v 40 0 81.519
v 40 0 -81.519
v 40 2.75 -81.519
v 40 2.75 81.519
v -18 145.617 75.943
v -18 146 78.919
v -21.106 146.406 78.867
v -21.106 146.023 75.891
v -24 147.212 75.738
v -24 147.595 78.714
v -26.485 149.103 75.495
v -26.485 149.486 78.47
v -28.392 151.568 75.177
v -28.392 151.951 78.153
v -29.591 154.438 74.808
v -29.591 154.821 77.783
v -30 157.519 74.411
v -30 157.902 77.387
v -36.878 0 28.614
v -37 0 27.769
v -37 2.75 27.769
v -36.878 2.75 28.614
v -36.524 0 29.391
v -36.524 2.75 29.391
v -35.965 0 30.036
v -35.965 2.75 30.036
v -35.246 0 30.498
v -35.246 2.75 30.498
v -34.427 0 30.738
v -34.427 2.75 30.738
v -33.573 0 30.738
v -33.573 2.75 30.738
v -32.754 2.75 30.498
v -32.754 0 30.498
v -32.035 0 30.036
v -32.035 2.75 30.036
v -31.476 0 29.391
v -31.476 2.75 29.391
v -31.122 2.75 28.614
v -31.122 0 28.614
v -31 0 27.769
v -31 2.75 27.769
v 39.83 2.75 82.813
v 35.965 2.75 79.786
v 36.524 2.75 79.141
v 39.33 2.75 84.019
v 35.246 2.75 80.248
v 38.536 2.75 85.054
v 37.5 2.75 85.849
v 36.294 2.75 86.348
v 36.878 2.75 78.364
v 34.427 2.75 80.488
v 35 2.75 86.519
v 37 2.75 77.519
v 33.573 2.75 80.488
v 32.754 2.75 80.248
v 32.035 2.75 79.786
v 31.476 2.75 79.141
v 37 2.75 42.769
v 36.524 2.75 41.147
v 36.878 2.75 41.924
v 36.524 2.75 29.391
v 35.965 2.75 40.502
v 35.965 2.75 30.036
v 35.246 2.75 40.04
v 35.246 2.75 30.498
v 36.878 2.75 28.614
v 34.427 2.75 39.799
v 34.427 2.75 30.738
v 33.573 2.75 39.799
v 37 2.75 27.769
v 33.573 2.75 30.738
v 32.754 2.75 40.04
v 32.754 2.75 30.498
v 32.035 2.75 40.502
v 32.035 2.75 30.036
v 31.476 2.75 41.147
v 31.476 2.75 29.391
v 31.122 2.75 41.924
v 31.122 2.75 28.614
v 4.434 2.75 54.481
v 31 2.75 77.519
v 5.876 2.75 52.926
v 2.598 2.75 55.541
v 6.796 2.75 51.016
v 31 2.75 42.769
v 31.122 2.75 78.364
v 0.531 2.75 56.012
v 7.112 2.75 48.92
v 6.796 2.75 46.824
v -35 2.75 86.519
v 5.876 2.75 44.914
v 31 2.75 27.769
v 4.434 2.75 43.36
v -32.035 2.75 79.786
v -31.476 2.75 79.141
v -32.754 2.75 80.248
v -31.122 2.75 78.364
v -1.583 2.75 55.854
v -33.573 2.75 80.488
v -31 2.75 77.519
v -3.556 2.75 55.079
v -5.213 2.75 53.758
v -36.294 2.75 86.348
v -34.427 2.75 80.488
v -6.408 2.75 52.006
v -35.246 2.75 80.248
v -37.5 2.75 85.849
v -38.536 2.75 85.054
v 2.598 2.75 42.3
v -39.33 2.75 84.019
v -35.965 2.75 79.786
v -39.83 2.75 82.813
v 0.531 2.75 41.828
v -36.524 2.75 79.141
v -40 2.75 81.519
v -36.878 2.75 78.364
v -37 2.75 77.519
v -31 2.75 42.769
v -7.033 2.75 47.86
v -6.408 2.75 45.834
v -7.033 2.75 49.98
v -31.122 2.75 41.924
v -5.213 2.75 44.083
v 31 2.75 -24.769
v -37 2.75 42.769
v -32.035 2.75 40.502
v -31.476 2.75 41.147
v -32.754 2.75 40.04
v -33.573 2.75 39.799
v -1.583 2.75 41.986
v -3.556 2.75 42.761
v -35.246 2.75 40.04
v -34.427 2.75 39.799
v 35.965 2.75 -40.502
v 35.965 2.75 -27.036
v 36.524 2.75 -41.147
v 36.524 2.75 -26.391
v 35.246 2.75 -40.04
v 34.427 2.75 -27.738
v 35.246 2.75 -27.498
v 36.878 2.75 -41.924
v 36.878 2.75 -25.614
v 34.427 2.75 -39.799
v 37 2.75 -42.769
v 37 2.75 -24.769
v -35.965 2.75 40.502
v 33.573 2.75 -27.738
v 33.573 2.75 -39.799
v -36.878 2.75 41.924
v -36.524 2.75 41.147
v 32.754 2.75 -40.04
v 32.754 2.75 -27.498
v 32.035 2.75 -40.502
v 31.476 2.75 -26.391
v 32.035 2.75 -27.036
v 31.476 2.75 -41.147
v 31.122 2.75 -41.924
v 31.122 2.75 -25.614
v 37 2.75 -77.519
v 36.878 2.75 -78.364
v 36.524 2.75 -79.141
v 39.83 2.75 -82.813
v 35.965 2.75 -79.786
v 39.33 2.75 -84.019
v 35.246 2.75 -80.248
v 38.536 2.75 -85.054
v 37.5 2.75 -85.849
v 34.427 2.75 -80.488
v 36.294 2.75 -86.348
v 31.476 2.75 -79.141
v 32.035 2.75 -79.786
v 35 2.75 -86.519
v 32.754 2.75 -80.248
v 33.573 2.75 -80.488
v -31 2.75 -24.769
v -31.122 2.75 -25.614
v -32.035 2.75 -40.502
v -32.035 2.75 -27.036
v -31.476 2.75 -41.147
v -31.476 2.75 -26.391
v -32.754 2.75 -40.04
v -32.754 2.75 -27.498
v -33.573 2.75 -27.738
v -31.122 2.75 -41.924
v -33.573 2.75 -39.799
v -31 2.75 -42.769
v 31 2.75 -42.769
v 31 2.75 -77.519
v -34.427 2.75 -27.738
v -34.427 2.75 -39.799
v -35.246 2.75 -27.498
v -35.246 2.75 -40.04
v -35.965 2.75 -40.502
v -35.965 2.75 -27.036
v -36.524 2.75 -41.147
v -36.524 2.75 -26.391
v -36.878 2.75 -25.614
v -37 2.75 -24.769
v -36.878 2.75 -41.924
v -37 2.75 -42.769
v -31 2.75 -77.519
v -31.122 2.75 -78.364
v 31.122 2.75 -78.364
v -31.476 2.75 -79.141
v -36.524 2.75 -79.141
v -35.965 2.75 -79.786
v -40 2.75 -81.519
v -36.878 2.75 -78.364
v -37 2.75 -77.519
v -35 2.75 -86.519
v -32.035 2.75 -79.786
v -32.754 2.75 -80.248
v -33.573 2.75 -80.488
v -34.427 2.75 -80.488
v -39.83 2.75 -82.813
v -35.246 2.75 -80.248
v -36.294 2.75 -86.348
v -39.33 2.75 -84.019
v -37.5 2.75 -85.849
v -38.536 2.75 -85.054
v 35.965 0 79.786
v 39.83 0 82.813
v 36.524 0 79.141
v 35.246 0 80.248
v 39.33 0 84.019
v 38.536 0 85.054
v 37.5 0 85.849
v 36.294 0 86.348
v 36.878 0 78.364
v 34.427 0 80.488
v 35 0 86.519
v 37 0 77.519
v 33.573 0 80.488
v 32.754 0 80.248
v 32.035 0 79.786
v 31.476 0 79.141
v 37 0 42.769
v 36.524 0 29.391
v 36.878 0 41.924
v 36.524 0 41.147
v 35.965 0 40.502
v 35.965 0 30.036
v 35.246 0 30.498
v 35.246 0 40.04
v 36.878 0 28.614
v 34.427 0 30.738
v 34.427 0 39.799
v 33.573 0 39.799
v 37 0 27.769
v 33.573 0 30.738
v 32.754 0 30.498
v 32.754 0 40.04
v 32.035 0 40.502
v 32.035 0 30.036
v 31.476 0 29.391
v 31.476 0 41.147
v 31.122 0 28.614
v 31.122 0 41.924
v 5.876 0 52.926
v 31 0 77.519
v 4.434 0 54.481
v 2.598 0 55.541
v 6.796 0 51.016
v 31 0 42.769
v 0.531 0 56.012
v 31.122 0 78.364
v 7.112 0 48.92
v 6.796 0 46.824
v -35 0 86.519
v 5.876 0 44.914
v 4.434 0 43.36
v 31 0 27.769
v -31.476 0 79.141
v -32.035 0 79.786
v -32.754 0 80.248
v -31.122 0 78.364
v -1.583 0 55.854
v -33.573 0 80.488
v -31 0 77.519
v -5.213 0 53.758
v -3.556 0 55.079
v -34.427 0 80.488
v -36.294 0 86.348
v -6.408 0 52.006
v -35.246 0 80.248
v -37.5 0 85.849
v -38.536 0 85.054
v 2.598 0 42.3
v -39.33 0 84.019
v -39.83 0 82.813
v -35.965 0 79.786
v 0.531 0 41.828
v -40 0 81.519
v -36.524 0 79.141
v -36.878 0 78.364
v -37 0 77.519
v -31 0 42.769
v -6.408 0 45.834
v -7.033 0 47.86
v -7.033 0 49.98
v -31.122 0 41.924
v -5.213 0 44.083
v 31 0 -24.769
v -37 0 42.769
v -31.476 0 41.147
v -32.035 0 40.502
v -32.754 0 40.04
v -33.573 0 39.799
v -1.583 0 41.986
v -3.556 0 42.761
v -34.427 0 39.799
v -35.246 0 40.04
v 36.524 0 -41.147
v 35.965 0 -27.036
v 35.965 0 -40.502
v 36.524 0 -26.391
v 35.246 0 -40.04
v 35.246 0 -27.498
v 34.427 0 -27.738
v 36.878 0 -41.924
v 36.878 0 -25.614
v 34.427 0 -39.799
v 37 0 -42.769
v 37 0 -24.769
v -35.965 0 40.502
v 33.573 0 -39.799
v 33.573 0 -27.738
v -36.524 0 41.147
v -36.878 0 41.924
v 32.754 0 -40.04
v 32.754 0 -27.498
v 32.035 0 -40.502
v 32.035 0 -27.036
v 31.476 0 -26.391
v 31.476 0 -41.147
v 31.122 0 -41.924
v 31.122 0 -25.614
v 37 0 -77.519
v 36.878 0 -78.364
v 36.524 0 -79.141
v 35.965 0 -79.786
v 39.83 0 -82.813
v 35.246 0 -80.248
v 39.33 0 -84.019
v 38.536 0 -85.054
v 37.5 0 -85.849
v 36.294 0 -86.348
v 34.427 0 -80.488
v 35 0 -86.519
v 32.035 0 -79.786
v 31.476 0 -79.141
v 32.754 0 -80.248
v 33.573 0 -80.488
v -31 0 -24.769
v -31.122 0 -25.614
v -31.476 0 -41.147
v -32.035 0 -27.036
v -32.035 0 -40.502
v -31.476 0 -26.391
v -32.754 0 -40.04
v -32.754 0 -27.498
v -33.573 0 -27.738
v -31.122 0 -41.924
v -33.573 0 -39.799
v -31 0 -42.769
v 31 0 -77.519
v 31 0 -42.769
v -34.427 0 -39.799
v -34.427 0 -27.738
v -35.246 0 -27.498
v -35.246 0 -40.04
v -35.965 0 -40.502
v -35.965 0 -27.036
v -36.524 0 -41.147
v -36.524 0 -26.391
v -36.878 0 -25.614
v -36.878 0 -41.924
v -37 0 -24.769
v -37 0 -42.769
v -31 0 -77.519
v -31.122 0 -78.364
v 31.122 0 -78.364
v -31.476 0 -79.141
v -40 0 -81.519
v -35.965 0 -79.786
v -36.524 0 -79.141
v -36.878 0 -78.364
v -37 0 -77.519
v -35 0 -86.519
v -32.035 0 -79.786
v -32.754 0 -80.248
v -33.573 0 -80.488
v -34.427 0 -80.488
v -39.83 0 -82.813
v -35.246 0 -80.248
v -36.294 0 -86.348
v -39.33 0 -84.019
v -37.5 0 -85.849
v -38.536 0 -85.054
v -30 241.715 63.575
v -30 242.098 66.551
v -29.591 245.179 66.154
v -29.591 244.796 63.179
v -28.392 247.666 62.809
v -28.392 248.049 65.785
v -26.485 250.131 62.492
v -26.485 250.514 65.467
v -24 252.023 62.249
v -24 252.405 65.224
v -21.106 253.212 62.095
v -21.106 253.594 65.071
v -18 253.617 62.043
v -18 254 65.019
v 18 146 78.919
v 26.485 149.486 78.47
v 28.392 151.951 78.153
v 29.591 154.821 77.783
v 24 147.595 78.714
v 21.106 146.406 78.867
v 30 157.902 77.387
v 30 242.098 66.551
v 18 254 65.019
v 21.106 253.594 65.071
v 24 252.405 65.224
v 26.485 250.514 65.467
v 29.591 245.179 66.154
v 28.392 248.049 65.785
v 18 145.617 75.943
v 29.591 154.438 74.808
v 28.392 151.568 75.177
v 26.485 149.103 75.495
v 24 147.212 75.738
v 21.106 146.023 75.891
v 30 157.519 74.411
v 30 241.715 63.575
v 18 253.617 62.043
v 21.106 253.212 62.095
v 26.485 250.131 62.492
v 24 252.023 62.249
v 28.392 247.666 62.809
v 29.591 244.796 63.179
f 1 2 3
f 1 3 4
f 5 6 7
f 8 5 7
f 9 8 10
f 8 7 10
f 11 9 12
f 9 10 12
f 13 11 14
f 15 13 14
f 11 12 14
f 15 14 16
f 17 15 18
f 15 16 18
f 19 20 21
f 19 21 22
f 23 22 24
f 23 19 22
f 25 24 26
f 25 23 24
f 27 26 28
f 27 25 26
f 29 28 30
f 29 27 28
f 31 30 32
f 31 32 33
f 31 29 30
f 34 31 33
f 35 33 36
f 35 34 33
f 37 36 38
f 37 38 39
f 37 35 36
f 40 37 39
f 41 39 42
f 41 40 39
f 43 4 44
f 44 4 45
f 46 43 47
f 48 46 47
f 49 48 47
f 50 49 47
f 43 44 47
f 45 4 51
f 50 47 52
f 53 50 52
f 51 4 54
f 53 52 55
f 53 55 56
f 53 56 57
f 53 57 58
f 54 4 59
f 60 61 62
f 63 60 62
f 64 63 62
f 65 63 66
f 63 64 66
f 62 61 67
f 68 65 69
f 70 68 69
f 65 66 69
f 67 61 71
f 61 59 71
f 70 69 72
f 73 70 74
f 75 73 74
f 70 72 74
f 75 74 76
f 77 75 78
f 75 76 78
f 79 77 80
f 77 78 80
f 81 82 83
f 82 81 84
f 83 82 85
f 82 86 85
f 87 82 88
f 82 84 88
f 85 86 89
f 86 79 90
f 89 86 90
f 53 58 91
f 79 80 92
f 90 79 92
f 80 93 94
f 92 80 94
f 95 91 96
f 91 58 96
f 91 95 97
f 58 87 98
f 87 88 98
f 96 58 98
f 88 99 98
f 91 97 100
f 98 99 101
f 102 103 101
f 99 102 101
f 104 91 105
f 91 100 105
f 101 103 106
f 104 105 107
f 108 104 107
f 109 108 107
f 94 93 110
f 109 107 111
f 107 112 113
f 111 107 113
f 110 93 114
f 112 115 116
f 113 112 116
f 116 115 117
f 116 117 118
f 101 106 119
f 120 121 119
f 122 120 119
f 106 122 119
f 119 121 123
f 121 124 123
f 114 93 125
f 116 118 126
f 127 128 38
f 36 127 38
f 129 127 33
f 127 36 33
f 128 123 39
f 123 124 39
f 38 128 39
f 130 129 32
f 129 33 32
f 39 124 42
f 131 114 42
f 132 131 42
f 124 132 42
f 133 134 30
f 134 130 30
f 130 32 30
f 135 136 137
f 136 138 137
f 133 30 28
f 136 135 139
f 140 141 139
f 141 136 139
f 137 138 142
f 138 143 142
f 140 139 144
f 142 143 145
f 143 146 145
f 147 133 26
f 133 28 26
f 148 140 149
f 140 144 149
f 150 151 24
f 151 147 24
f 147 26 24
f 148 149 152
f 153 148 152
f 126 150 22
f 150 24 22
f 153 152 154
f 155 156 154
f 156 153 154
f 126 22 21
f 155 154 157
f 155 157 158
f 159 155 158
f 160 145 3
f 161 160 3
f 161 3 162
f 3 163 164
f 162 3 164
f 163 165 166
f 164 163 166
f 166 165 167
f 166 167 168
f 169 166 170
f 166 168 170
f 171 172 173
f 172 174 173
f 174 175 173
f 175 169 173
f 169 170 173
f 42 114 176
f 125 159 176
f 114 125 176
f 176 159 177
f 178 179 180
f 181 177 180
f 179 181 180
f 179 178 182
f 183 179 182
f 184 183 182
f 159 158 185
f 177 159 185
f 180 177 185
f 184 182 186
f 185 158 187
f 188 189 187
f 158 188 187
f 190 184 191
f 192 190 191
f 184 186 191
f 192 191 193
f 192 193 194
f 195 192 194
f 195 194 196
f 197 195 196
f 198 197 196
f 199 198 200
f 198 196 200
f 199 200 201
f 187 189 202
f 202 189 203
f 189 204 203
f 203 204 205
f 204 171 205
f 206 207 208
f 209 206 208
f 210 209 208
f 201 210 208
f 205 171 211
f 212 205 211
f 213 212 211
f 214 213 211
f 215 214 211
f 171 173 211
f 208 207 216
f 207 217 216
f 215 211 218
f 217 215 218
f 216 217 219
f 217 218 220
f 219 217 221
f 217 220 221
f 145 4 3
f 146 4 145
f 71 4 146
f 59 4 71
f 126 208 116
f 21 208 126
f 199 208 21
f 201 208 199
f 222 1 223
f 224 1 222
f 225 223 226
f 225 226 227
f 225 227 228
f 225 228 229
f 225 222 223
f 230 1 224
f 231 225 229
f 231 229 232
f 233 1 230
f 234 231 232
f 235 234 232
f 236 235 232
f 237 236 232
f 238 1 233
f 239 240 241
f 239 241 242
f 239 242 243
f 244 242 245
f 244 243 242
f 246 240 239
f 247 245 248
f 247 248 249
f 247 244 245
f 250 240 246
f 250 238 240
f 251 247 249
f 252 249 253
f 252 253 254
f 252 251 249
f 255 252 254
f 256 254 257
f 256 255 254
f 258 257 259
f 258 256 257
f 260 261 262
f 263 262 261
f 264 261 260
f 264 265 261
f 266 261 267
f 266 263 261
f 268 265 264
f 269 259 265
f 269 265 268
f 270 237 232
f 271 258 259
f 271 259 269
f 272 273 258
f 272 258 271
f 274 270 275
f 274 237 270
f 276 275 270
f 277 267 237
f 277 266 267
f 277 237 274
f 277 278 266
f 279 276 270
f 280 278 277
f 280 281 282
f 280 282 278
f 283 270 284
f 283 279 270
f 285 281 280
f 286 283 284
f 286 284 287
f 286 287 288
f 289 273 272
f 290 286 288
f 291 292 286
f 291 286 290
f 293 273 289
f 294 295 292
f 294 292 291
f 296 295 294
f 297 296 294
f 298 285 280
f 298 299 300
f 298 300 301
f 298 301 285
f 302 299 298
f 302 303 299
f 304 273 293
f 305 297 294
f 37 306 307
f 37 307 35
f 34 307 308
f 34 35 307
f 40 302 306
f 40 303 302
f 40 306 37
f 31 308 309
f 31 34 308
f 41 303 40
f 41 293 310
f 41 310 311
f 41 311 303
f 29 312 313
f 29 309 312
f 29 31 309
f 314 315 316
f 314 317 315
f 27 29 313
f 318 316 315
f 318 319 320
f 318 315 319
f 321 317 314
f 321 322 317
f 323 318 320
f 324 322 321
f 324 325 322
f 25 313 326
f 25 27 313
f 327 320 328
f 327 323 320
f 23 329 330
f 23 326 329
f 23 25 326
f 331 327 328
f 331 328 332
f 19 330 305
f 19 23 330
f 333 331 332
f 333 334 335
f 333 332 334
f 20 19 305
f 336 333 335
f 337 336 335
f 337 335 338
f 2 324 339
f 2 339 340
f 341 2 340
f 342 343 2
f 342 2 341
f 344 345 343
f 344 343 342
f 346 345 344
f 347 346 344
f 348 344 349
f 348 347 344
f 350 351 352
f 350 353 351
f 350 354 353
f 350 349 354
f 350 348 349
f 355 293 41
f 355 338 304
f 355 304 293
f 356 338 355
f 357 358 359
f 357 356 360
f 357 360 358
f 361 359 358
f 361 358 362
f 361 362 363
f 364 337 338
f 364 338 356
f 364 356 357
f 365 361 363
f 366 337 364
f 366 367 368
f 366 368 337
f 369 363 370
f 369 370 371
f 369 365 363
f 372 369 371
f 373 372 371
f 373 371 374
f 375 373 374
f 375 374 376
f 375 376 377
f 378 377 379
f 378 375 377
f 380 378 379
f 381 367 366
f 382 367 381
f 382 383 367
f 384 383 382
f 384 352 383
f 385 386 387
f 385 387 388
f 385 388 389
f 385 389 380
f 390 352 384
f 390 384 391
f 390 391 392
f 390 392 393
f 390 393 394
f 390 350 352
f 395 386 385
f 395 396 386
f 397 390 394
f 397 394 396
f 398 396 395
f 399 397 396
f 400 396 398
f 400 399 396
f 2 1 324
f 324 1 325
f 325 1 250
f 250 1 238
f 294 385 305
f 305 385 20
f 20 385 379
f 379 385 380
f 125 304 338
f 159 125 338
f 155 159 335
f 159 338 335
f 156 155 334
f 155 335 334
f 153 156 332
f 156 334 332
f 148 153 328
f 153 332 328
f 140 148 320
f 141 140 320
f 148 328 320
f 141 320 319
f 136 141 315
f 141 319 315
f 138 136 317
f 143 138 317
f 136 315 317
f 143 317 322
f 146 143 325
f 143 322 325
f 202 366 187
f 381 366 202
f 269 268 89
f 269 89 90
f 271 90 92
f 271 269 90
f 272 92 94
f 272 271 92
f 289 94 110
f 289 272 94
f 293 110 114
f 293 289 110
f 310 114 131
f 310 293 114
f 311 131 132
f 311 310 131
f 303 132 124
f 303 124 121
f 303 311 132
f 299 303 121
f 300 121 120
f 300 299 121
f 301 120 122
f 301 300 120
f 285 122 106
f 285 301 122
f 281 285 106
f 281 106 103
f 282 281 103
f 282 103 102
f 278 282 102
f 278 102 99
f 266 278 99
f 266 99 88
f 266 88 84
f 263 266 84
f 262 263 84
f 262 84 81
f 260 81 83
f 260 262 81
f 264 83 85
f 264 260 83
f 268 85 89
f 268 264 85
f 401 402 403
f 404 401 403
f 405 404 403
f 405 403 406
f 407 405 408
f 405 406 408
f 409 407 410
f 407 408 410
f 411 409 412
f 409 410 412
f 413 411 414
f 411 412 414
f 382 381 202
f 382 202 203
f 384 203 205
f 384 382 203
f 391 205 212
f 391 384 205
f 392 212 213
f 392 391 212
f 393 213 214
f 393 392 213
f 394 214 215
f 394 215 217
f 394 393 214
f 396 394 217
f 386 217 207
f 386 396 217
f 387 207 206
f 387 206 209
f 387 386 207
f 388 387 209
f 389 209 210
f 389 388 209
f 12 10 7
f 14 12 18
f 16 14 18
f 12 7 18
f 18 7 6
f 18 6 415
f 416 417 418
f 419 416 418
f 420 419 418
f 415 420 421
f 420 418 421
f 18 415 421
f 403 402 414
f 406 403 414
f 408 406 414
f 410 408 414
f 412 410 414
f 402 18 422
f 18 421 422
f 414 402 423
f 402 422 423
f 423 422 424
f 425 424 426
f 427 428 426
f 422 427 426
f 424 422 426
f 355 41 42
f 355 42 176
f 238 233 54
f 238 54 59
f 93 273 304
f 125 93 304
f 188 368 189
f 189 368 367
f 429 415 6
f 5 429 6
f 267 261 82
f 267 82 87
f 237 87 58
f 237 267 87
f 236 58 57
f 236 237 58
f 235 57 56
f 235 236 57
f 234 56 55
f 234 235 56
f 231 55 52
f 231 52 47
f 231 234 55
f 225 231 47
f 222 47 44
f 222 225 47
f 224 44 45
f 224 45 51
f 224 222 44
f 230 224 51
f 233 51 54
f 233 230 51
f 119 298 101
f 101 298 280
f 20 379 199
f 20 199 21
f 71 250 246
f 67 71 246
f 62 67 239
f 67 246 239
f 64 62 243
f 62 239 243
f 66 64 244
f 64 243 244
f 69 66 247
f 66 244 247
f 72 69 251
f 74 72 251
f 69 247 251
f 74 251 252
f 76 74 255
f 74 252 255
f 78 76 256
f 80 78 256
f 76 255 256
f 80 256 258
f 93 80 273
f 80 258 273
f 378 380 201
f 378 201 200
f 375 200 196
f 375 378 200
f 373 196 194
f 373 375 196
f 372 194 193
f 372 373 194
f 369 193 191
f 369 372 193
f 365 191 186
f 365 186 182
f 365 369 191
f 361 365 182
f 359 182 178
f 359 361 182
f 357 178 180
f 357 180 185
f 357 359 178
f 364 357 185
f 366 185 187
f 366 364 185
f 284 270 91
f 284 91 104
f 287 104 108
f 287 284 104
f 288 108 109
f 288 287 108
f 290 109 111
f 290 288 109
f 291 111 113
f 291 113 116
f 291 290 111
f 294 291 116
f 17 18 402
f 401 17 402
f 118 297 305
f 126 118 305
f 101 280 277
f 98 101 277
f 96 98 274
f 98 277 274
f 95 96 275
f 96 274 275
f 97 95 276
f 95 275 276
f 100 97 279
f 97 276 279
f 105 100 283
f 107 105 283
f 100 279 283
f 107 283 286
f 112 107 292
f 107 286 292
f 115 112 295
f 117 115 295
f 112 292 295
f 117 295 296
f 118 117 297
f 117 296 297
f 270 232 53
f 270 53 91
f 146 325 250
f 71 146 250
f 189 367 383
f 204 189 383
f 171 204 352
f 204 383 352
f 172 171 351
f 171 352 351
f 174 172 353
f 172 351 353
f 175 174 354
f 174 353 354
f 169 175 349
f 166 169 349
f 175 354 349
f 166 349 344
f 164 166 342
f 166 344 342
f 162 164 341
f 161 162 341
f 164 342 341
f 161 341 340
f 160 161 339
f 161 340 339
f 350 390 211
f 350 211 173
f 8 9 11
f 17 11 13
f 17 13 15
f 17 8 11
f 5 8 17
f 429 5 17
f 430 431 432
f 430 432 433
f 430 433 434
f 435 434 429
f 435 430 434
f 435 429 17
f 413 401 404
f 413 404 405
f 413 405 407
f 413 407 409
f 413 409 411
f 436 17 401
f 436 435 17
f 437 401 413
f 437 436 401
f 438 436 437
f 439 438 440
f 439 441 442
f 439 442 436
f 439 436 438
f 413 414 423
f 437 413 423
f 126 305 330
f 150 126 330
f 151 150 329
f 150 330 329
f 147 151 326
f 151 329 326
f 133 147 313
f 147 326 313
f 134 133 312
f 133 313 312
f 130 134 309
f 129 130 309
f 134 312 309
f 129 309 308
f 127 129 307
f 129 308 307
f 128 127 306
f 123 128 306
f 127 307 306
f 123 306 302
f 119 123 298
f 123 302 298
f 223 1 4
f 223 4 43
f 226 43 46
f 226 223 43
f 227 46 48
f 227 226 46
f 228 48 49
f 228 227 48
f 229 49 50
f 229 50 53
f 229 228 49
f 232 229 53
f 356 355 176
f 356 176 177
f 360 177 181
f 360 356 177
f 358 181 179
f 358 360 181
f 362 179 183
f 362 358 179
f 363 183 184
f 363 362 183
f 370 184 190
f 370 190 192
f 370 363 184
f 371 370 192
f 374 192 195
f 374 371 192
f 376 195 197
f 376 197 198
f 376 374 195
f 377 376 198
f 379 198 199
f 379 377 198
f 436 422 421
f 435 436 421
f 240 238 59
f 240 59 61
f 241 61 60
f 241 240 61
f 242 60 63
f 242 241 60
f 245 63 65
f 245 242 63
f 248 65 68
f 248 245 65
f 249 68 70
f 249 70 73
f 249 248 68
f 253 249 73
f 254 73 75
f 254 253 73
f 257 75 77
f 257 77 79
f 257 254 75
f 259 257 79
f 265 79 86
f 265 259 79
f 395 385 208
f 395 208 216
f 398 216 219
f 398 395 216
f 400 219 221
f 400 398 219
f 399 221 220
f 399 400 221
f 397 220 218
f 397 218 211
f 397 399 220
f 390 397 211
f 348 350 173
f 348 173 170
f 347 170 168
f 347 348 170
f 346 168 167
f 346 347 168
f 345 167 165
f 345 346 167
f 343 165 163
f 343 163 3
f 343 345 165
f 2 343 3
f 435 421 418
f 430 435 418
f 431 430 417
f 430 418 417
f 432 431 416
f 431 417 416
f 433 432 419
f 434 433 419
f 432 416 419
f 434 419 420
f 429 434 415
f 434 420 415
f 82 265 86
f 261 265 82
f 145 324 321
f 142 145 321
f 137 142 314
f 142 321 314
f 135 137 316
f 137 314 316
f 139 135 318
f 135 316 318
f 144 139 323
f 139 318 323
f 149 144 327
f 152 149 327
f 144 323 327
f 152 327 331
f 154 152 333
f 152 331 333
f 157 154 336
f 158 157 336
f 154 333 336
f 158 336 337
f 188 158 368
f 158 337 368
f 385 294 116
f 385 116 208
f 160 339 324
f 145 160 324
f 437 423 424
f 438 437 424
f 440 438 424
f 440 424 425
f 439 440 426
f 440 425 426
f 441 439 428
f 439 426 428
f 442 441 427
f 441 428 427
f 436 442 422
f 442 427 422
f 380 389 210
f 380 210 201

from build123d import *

# Parameters (mm, degrees)
SKETCH1_R           = 7.112045721
BOSS_EXTRUDE1_DEPTH = 2.75
BOSS_EXTRUDE2_DEPTH = 3


with BuildPart() as part:
    # Sketch1 → Boss-Extrude1 (new body)
    with BuildSketch(Plane(origin=(0, 0, 0), x_dir=(1, 0, 0), z_dir=(0, 1, 0))):
        with BuildLine():
            Line((-35, 86.51875), (35, 86.51875))
            ThreePointArc((35, 86.51875), (38.535533906, 85.054283906), (40, 81.51875))
            Line((40, 81.51875), (40, -81.51875))
            ThreePointArc((40, -81.51875), (38.535533906, -85.054283906), (35, -86.51875))
            Line((35, -86.51875), (-35, -86.51875))
            ThreePointArc((-35, -86.51875), (-38.535533906, -85.054283906), (-40, -81.51875))
            Line((-40, -81.51875), (-40, 81.51875))
            ThreePointArc((-40, 81.51875), (-38.535533906, 85.054283906), (-35, 86.51875))
        make_face()
        with Locations((0, -48.920084539)):
            Circle(SKETCH1_R, mode=Mode.SUBTRACT)
        with BuildLine():
            Line((37, 77.51875), (37, 42.76875))
            ThreePointArc((37, 42.76875), (34, 39.76875), (31, 42.76875))
            Line((31, 42.76875), (31, 77.51875))
            ThreePointArc((31, 77.51875), (34, 80.51875), (37, 77.51875))
        make_face(mode=Mode.SUBTRACT)
        with BuildLine():
            Line((-37, 77.51875), (-37, 42.76875))
            ThreePointArc((-37, 42.76875), (-34, 39.76875), (-31, 42.76875))
            Line((-31, 42.76875), (-31, 77.51875))
            ThreePointArc((-31, 77.51875), (-34, 80.51875), (-37, 77.51875))
        make_face(mode=Mode.SUBTRACT)
        with BuildLine():
            Line((37, -77.51875), (37, -42.76875))
            ThreePointArc((37, -42.76875), (34, -39.76875), (31, -42.76875))
            Line((31, -42.76875), (31, -77.51875))
            ThreePointArc((31, -77.51875), (34, -80.51875), (37, -77.51875))
        make_face(mode=Mode.SUBTRACT)
        with BuildLine():
            Line((-37, -77.51875), (-37, -42.76875))
            ThreePointArc((-37, -42.76875), (-34, -39.76875), (-31, -42.76875))
            Line((-31, -42.76875), (-31, -77.51875))
            ThreePointArc((-31, -77.51875), (-34, -80.51875), (-37, -77.51875))
        make_face(mode=Mode.SUBTRACT)
        with BuildLine():
            Line((37, 24.76875), (37, -27.76875))
            ThreePointArc((37, -27.76875), (34, -30.76875), (31, -27.76875))
            Line((31, -27.76875), (31, 24.76875))
            ThreePointArc((31, 24.76875), (34, 27.76875), (37, 24.76875))
        make_face(mode=Mode.SUBTRACT)
        with BuildLine():
            Line((-37, 24.76875), (-37, -27.76875))
            ThreePointArc((-37, -27.76875), (-34, -30.76875), (-31, -27.76875))
            Line((-31, -27.76875), (-31, 24.76875))
            ThreePointArc((-31, 24.76875), (-34, 27.76875), (-37, 24.76875))
        make_face(mode=Mode.SUBTRACT)
    extrude(amount=BOSS_EXTRUDE1_DEPTH)


with BuildPart() as body_2:
    # Sketch3 → Boss-Extrude2 (new body)
    with BuildSketch(Plane(origin=(0, 12.370657811, 96.117341263), x_dir=(0, -0.991819174, 0.127650801), z_dir=(0, 0.127650801, 0.991819174))):
        with BuildLine():
            Line((-231.622374558, 30), (-146.731557682, 30))
            ThreePointArc((-146.731557682, 30), (-138.246276308, 26.485281374), (-134.731557682, 18))
            Line((-134.731557682, 18), (-134.731557682, -18))
            ThreePointArc((-134.731557682, -18), (-138.246276308, -26.485281374), (-146.731557682, -30))
            Line((-146.731557682, -30), (-231.622374558, -30))
            ThreePointArc((-231.622374558, -30), (-240.107655932, -26.485281374), (-243.622374558, -18))
            Line((-243.622374558, -18), (-243.622374558, 18))
            ThreePointArc((-243.622374558, 18), (-240.107655932, 26.485281374), (-231.622374558, 30))
        make_face()
    extrude(amount=-BOSS_EXTRUDE2_DEPTH)


solid = Compound([part.part, body_2.part])
